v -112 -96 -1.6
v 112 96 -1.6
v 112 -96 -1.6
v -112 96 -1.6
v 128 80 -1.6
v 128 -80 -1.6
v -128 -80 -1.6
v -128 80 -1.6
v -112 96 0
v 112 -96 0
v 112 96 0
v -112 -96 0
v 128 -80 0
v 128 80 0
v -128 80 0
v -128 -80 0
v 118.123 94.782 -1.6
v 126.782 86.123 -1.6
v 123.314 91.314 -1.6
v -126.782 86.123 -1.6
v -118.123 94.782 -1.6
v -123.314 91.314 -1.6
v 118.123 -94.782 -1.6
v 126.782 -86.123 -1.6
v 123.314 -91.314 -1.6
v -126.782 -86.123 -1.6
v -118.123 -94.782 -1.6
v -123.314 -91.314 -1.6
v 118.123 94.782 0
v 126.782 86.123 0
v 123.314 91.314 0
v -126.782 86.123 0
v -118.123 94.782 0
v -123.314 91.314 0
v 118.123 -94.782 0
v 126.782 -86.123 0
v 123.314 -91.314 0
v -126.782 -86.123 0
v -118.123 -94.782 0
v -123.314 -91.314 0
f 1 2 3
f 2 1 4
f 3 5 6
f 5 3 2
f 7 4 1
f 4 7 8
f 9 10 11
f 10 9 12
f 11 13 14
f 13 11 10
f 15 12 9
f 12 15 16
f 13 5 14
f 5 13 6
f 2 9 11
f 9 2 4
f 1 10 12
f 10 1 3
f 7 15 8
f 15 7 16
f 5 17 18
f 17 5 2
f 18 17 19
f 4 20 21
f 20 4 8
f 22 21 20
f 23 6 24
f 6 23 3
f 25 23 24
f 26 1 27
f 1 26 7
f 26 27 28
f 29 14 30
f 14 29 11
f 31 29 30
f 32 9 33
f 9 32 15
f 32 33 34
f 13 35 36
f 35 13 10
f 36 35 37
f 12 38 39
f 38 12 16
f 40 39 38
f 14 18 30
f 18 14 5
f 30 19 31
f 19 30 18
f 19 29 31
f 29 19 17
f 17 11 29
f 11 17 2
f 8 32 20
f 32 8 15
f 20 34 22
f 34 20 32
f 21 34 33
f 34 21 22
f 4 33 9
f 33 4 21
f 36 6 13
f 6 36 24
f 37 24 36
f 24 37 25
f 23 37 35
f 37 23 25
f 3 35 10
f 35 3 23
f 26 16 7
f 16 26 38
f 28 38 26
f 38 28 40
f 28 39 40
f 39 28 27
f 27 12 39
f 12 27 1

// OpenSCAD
// file: ../../p/1-4edge.scad
use <../lib.scad>
function ldraw_lib__1_4edge() = [
// 0 Circle 0.25
// 0 Name: 1-4edge.dat
// 0 Author: James Jessiman
// 0 !LDRAW_ORG Primitive UPDATE 2017-01
// 0 !LICENSE Licensed under CC BY 2.0 and CC BY 4.0 : see CAreadme.txt
// 
// 0 BFC CERTIFY CCW
  [0,"BFC","CERTIFY"],
  [0,"BFC","CCW"],
// 
// 0 !HISTORY 2007-06-22 [PTadmin] Header formatted for Contributor Agreement
// 0 !HISTORY 2008-07-01 [PTadmin] Official Update 2008-01
// 0 !HISTORY 2017-01-15 [Steffen] BFCed
// 0 !HISTORY 2017-12-30 [PTadmin] Official Update 2017-01
// 
// 
// 2 24 1 0 0 0.9239 0 0.3827
  [2,24,1,0,0,0.9239,0,0.3827],
// 2 24 0.9239 0 0.3827 0.7071 0 0.7071
  [2,24,0.9239,0,0.3827,0.7071,0,0.7071],
// 2 24 0.7071 0 0.7071 0.3827 0 0.9239
  [2,24,0.7071,0,0.7071,0.3827,0,0.9239],
// 2 24 0.3827 0 0.9239 0 0 1
  [2,24,0.3827,0,0.9239,0,0,1],
];
makepoly(ldraw_lib__1_4edge(), line=0.2);
// file: ../../p/1-4cyli.scad
use <../lib.scad>
function ldraw_lib__1_4cyli() = [
// 0 Cylinder 0.25
// 0 Name: 1-4cyli.dat
// 0 Author: James Jessiman
// 0 !LDRAW_ORG Primitive UPDATE 2012-01
// 0 !LICENSE Licensed under CC BY 2.0 and CC BY 4.0 : see CAreadme.txt
// 
// 0 BFC CERTIFY CCW
  [0,"BFC","CERTIFY"],
  [0,"BFC","CCW"],
// 
// 0 !HISTORY 2002-03-23 [sbliss] Added BFC statement.
// 0 !HISTORY 2002-04-25 [PTadmin] Official Update 2002-02
// 0 !HISTORY 2007-06-22 [PTadmin] Header formatted for Contributor Agreement
// 0 !HISTORY 2008-07-01 [PTadmin] Official Update 2008-01
// 0 !HISTORY 2012-02-16 [Philo] Changed to CCW
// 0 !HISTORY 2012-03-30 [PTadmin] Official Update 2012-01
// 
// 
// 4 16 1 1 0 0.9239 1 0.3827 0.9239 0 0.3827 1 0 0
  [4,16,1,1,0,0.9239,1,0.3827,0.9239,0,0.3827,1,0,0],
// 5 24 1 0 0 1 1 0 0.9239 0 0.3827 1 0 -1
  [5,24,1,0,0,1,1,0,0.9239,0,0.3827,1,0,-1],
// 4 16 0.9239 1 0.3827 0.7071 1 0.7071 0.7071 0 0.7071 0.9239 0 0.3827
  [4,16,0.9239,1,0.3827,0.7071,1,0.7071,0.7071,0,0.7071,0.9239,0,0.3827],
// 5 24 0.9239 0 0.3827 0.9239 1 0.3827 0.7071 0 0.7071 1 0 0
  [5,24,0.9239,0,0.3827,0.9239,1,0.3827,0.7071,0,0.7071,1,0,0],
// 4 16 0.7071 1 0.7071 0.3827 1 0.9239 0.3827 0 0.9239 0.7071 0 0.7071
  [4,16,0.7071,1,0.7071,0.3827,1,0.9239,0.3827,0,0.9239,0.7071,0,0.7071],
// 5 24 0.7071 0 0.7071 0.7071 1 0.7071 0.3827 0 0.9239 0.9239 0 0.3827
  [5,24,0.7071,0,0.7071,0.7071,1,0.7071,0.3827,0,0.9239,0.9239,0,0.3827],
// 4 16 0.3827 1 0.9239 0 1 1 0 0 1 0.3827 0 0.9239
  [4,16,0.3827,1,0.9239,0,1,1,0,0,1,0.3827,0,0.9239],
// 5 24 0.3827 0 0.9239 0.3827 1 0.9239 0 0 1 0.7071 0 0.7071
  [5,24,0.3827,0,0.9239,0.3827,1,0.9239,0,0,1,0.7071,0,0.7071],
// 5 24 0 0 1 0 1 1 0.3827 0 0.9239 -1 0 1
  [5,24,0,0,1,0,1,1,0.3827,0,0.9239,-1,0,1],
];
makepoly(ldraw_lib__1_4cyli(), line=0.2);
// file: ../../p/rect2p.scad
use <../lib.scad>
function ldraw_lib__rect2p() = [
// 0 Rectangle with 2 Parallel Edges
// 0 Name: rect2p.dat
// 0 Author: Donald Sutter [technog]
// 0 !LDRAW_ORG Primitive UPDATE 2010-01
// 0 !LICENSE Licensed under CC BY 2.0 and CC BY 4.0 : see CAreadme.txt
// 
// 0 BFC CERTIFY CCW
  [0,"BFC","CERTIFY"],
  [0,"BFC","CCW"],
// 
// 0 !HISTORY 2003-08-01 [PTadmin] Official Update 2003-02
// 0 !HISTORY 2007-06-24 [PTadmin] Header formatted for Contributor Agreement
// 0 !HISTORY 2008-07-01 [PTadmin] Official Update 2008-01
// 0 !HISTORY 2010-01-17 [mikeheide] changed winding to CCW
// 0 !HISTORY 2010-04-05 [PTadmin] Official Update 2010-01
// 
// 
// 2 24 1 0 1 -1 0 1
  [2,24,1,0,1,-1,0,1],
// 2 24 -1 0 -1 1 0 -1
  [2,24,-1,0,-1,1,0,-1],
// 4 16 -1 0 1 -1 0 -1 1 0 -1 1 0 1
  [4,16,-1,0,1,-1,0,-1,1,0,-1,1,0,1],
// 0
];
makepoly(ldraw_lib__rect2p(), line=0.2);
// file: ../../p/1-4cylo.scad
use <../lib.scad>
use <1-4cyli.scad>
use <1-4edge.scad>
function ldraw_lib__1_4cylo() = [
// 0 Cylinder Open 0.25
// 0 Name: 1-4cylo.dat
// 0 Author: Max Martin Richter [MMR1988]
// 0 !LDRAW_ORG Primitive UPDATE 2010-03
// 0 !LICENSE Licensed under CC BY 2.0 and CC BY 4.0 : see CAreadme.txt
// 
// 0 BFC CERTIFY CCW
  [0,"BFC","CERTIFY"],
  [0,"BFC","CCW"],
// 
// 0 !HISTORY 2010-12-31 [PTadmin] Official Update 2010-03
// 
// 
// 1 16 0 0 0 1 0 0 0 1 0 0 0 1 1-4edge.dat
  [1,16,0,0,0,1,0,0,0,1,0,0,0,1, ldraw_lib__1_4edge()],
// 1 16 0 1 0 1 0 0 0 1 0 0 0 1 1-4edge.dat
  [1,16,0,1,0,1,0,0,0,1,0,0,0,1, ldraw_lib__1_4edge()],
// 1 16 0 0 0 1 0 0 0 1 0 0 0 1 1-4cyli.dat
  [1,16,0,0,0,1,0,0,0,1,0,0,0,1, ldraw_lib__1_4cyli()],
];
makepoly(ldraw_lib__1_4cylo(), line=0.2);
// file: ../../p/1-4chrd.scad
use <../lib.scad>
function ldraw_lib__1_4chrd() = [
// 0 Chord 0.25
// 0 Name: 1-4chrd.dat
// 0 Author: Tony Hafner [hafhead]
// 0 !LDRAW_ORG Primitive UPDATE 2012-02
// 0 !LICENSE Licensed under CC BY 2.0 and CC BY 4.0 : see CAreadme.txt
// 
// 0 BFC CERTIFY CCW
  [0,"BFC","CERTIFY"],
  [0,"BFC","CCW"],
// 
// 0 !HISTORY 2004-04-22 [PTadmin] Official Update 2004-02
// 0 !HISTORY 2007-10-09 [PTadmin] Header formatted for Contributor Agreement
// 0 !HISTORY 2008-07-01 [PTadmin] Official Update 2008-01
// 0 !HISTORY 2012-08-02 [MMR1988] Re-creation with PrimGen2 and Rectifier
// 0 !HISTORY 2012-08-09 [PTadmin] Official Update 2012-02
// 
// 
// 4 16 0.9239 0 0.3827 0.3827 0 0.9239 0 0 1 1 0 0
  [4,16,0.9239,0,0.3827,0.3827,0,0.9239,0,0,1,1,0,0],
// 3 16 0.7071 0 0.7071 0.3827 0 0.9239 0.9239 0 0.3827
  [3,16,0.7071,0,0.7071,0.3827,0,0.9239,0.9239,0,0.3827],
];
makepoly(ldraw_lib__1_4chrd(), line=0.2);
// main file
use <../../lib.scad>
use <../../p/1-4chrd.scad>
use <../../p/1-4cylo.scad>
use <../../p/rect2p.scad>
function ldraw_lib__s__10s01() = [
// 0 ~Baseplate 24 x 32 with Rounded Corners without Studs
// 0 Name: s\10s01.dat
// 0 Author: Mark Kennedy [mkennedy]
// 0 !LDRAW_ORG Subpart UPDATE 2013-01
// 0 !LICENSE Licensed under CC BY 2.0 and CC BY 4.0 : see CAreadme.txt
// 
// 0 BFC CERTIFY CCW
  [0,"BFC","CERTIFY"],
  [0,"BFC","CCW"],
// 
// 0 !HISTORY 2006-01-07 [WilliamH] Added top surface to sub-part
// 0 !HISTORY 2009-05-05 [mkennedy] Used 1-4cylc in corners
// 0 !HISTORY 2010-04-05 [PTadmin] Official Update 2010-01
// 0 !HISTORY 2013-02-03 [MMR1988] used chrd and changed some quads to avoid t-junctions
// 0 !HISTORY 2013-07-21 [PTadmin] Official Update 2013-01
// 
// 
// 4 16 280 4 240 280 4 -240 -280 4 -240 -280 4 240
  [4,16,280,4,240,280,4,-240,-280,4,-240,-280,4,240],
// 4 16 320 4 200 320 4 -200 280 4 -240 280 4 240
  [4,16,320,4,200,320,4,-200,280,4,-240,280,4,240],
// 4 16 -280 4 240 -280 4 -240 -320 4 -200 -320 4 200
  [4,16,-280,4,240,-280,4,-240,-320,4,-200,-320,4,200],
// 4 16 -280 0 240 -280 0 -240 280 0 -240 280 0 240
  [4,16,-280,0,240,-280,0,-240,280,0,-240,280,0,240],
// 4 16 280 0 240 280 0 -240 320 0 -200 320 0 200
  [4,16,280,0,240,280,0,-240,320,0,-200,320,0,200],
// 4 16 -320 0 200 -320 0 -200 -280 0 -240 -280 0 240
  [4,16,-320,0,200,-320,0,-200,-280,0,-240,-280,0,240],
// 
// 1 16 320 2 0 0 -1 0 0 0 2 -200 0 0 rect2p.dat
  [1,16,320,2,0,0,-1,0,0,0,2,-200,0,0, ldraw_lib__rect2p()],
// 1 16 0 2 240 -280 0 0 0 0 2 0 -1 0 rect2p.dat
  [1,16,0,2,240,-280,0,0,0,0,2,0,-1,0, ldraw_lib__rect2p()],
// 1 16 0 2 -240 -280 0 0 0 0 2 0 1 0 rect2p.dat
  [1,16,0,2,-240,-280,0,0,0,0,2,0,1,0, ldraw_lib__rect2p()],
// 1 16 -320 2 0 0 1 0 0 0 2 -200 0 0 rect2p.dat
  [1,16,-320,2,0,0,1,0,0,0,2,-200,0,0, ldraw_lib__rect2p()],
// 
// 1 16 280 4 200 40 0 0 0 -1 0 0 0 40 1-4chrd.dat
  [1,16,280,4,200,40,0,0,0,-1,0,0,0,40, ldraw_lib__1_4chrd()],
// 1 16 -280 4 200 -40 0 0 0 -1 0 0 0 40 1-4chrd.dat
  [1,16,-280,4,200,-40,0,0,0,-1,0,0,0,40, ldraw_lib__1_4chrd()],
// 1 16 280 4 -200 40 0 0 0 -1 0 0 0 -40 1-4chrd.dat
  [1,16,280,4,-200,40,0,0,0,-1,0,0,0,-40, ldraw_lib__1_4chrd()],
// 1 16 -280 4 -200 -40 0 0 0 -1 0 0 0 -40 1-4chrd.dat
  [1,16,-280,4,-200,-40,0,0,0,-1,0,0,0,-40, ldraw_lib__1_4chrd()],
// 1 16 280 0 200 40 0 0 0 1 0 0 0 40 1-4chrd.dat
  [1,16,280,0,200,40,0,0,0,1,0,0,0,40, ldraw_lib__1_4chrd()],
// 1 16 -280 0 200 -40 0 0 0 1 0 0 0 40 1-4chrd.dat
  [1,16,-280,0,200,-40,0,0,0,1,0,0,0,40, ldraw_lib__1_4chrd()],
// 1 16 280 0 -200 40 0 0 0 1 0 0 0 -40 1-4chrd.dat
  [1,16,280,0,-200,40,0,0,0,1,0,0,0,-40, ldraw_lib__1_4chrd()],
// 1 16 -280 0 -200 -40 0 0 0 1 0 0 0 -40 1-4chrd.dat
  [1,16,-280,0,-200,-40,0,0,0,1,0,0,0,-40, ldraw_lib__1_4chrd()],
// 
// 1 16 280 0 200 40 0 0 0 4 0 0 0 40 1-4cylo.dat
  [1,16,280,0,200,40,0,0,0,4,0,0,0,40, ldraw_lib__1_4cylo()],
// 1 16 -280 0 200 -40 0 0 0 4 0 0 0 40 1-4cylo.dat
  [1,16,-280,0,200,-40,0,0,0,4,0,0,0,40, ldraw_lib__1_4cylo()],
// 1 16 280 0 -200 40 0 0 0 4 0 0 0 -40 1-4cylo.dat
  [1,16,280,0,-200,40,0,0,0,4,0,0,0,-40, ldraw_lib__1_4cylo()],
// 1 16 -280 0 -200 -40 0 0 0 4 0 0 0 -40 1-4cylo.dat
  [1,16,-280,0,-200,-40,0,0,0,4,0,0,0,-40, ldraw_lib__1_4cylo()],
];
makepoly(ldraw_lib__s__10s01(), line=0.2);
